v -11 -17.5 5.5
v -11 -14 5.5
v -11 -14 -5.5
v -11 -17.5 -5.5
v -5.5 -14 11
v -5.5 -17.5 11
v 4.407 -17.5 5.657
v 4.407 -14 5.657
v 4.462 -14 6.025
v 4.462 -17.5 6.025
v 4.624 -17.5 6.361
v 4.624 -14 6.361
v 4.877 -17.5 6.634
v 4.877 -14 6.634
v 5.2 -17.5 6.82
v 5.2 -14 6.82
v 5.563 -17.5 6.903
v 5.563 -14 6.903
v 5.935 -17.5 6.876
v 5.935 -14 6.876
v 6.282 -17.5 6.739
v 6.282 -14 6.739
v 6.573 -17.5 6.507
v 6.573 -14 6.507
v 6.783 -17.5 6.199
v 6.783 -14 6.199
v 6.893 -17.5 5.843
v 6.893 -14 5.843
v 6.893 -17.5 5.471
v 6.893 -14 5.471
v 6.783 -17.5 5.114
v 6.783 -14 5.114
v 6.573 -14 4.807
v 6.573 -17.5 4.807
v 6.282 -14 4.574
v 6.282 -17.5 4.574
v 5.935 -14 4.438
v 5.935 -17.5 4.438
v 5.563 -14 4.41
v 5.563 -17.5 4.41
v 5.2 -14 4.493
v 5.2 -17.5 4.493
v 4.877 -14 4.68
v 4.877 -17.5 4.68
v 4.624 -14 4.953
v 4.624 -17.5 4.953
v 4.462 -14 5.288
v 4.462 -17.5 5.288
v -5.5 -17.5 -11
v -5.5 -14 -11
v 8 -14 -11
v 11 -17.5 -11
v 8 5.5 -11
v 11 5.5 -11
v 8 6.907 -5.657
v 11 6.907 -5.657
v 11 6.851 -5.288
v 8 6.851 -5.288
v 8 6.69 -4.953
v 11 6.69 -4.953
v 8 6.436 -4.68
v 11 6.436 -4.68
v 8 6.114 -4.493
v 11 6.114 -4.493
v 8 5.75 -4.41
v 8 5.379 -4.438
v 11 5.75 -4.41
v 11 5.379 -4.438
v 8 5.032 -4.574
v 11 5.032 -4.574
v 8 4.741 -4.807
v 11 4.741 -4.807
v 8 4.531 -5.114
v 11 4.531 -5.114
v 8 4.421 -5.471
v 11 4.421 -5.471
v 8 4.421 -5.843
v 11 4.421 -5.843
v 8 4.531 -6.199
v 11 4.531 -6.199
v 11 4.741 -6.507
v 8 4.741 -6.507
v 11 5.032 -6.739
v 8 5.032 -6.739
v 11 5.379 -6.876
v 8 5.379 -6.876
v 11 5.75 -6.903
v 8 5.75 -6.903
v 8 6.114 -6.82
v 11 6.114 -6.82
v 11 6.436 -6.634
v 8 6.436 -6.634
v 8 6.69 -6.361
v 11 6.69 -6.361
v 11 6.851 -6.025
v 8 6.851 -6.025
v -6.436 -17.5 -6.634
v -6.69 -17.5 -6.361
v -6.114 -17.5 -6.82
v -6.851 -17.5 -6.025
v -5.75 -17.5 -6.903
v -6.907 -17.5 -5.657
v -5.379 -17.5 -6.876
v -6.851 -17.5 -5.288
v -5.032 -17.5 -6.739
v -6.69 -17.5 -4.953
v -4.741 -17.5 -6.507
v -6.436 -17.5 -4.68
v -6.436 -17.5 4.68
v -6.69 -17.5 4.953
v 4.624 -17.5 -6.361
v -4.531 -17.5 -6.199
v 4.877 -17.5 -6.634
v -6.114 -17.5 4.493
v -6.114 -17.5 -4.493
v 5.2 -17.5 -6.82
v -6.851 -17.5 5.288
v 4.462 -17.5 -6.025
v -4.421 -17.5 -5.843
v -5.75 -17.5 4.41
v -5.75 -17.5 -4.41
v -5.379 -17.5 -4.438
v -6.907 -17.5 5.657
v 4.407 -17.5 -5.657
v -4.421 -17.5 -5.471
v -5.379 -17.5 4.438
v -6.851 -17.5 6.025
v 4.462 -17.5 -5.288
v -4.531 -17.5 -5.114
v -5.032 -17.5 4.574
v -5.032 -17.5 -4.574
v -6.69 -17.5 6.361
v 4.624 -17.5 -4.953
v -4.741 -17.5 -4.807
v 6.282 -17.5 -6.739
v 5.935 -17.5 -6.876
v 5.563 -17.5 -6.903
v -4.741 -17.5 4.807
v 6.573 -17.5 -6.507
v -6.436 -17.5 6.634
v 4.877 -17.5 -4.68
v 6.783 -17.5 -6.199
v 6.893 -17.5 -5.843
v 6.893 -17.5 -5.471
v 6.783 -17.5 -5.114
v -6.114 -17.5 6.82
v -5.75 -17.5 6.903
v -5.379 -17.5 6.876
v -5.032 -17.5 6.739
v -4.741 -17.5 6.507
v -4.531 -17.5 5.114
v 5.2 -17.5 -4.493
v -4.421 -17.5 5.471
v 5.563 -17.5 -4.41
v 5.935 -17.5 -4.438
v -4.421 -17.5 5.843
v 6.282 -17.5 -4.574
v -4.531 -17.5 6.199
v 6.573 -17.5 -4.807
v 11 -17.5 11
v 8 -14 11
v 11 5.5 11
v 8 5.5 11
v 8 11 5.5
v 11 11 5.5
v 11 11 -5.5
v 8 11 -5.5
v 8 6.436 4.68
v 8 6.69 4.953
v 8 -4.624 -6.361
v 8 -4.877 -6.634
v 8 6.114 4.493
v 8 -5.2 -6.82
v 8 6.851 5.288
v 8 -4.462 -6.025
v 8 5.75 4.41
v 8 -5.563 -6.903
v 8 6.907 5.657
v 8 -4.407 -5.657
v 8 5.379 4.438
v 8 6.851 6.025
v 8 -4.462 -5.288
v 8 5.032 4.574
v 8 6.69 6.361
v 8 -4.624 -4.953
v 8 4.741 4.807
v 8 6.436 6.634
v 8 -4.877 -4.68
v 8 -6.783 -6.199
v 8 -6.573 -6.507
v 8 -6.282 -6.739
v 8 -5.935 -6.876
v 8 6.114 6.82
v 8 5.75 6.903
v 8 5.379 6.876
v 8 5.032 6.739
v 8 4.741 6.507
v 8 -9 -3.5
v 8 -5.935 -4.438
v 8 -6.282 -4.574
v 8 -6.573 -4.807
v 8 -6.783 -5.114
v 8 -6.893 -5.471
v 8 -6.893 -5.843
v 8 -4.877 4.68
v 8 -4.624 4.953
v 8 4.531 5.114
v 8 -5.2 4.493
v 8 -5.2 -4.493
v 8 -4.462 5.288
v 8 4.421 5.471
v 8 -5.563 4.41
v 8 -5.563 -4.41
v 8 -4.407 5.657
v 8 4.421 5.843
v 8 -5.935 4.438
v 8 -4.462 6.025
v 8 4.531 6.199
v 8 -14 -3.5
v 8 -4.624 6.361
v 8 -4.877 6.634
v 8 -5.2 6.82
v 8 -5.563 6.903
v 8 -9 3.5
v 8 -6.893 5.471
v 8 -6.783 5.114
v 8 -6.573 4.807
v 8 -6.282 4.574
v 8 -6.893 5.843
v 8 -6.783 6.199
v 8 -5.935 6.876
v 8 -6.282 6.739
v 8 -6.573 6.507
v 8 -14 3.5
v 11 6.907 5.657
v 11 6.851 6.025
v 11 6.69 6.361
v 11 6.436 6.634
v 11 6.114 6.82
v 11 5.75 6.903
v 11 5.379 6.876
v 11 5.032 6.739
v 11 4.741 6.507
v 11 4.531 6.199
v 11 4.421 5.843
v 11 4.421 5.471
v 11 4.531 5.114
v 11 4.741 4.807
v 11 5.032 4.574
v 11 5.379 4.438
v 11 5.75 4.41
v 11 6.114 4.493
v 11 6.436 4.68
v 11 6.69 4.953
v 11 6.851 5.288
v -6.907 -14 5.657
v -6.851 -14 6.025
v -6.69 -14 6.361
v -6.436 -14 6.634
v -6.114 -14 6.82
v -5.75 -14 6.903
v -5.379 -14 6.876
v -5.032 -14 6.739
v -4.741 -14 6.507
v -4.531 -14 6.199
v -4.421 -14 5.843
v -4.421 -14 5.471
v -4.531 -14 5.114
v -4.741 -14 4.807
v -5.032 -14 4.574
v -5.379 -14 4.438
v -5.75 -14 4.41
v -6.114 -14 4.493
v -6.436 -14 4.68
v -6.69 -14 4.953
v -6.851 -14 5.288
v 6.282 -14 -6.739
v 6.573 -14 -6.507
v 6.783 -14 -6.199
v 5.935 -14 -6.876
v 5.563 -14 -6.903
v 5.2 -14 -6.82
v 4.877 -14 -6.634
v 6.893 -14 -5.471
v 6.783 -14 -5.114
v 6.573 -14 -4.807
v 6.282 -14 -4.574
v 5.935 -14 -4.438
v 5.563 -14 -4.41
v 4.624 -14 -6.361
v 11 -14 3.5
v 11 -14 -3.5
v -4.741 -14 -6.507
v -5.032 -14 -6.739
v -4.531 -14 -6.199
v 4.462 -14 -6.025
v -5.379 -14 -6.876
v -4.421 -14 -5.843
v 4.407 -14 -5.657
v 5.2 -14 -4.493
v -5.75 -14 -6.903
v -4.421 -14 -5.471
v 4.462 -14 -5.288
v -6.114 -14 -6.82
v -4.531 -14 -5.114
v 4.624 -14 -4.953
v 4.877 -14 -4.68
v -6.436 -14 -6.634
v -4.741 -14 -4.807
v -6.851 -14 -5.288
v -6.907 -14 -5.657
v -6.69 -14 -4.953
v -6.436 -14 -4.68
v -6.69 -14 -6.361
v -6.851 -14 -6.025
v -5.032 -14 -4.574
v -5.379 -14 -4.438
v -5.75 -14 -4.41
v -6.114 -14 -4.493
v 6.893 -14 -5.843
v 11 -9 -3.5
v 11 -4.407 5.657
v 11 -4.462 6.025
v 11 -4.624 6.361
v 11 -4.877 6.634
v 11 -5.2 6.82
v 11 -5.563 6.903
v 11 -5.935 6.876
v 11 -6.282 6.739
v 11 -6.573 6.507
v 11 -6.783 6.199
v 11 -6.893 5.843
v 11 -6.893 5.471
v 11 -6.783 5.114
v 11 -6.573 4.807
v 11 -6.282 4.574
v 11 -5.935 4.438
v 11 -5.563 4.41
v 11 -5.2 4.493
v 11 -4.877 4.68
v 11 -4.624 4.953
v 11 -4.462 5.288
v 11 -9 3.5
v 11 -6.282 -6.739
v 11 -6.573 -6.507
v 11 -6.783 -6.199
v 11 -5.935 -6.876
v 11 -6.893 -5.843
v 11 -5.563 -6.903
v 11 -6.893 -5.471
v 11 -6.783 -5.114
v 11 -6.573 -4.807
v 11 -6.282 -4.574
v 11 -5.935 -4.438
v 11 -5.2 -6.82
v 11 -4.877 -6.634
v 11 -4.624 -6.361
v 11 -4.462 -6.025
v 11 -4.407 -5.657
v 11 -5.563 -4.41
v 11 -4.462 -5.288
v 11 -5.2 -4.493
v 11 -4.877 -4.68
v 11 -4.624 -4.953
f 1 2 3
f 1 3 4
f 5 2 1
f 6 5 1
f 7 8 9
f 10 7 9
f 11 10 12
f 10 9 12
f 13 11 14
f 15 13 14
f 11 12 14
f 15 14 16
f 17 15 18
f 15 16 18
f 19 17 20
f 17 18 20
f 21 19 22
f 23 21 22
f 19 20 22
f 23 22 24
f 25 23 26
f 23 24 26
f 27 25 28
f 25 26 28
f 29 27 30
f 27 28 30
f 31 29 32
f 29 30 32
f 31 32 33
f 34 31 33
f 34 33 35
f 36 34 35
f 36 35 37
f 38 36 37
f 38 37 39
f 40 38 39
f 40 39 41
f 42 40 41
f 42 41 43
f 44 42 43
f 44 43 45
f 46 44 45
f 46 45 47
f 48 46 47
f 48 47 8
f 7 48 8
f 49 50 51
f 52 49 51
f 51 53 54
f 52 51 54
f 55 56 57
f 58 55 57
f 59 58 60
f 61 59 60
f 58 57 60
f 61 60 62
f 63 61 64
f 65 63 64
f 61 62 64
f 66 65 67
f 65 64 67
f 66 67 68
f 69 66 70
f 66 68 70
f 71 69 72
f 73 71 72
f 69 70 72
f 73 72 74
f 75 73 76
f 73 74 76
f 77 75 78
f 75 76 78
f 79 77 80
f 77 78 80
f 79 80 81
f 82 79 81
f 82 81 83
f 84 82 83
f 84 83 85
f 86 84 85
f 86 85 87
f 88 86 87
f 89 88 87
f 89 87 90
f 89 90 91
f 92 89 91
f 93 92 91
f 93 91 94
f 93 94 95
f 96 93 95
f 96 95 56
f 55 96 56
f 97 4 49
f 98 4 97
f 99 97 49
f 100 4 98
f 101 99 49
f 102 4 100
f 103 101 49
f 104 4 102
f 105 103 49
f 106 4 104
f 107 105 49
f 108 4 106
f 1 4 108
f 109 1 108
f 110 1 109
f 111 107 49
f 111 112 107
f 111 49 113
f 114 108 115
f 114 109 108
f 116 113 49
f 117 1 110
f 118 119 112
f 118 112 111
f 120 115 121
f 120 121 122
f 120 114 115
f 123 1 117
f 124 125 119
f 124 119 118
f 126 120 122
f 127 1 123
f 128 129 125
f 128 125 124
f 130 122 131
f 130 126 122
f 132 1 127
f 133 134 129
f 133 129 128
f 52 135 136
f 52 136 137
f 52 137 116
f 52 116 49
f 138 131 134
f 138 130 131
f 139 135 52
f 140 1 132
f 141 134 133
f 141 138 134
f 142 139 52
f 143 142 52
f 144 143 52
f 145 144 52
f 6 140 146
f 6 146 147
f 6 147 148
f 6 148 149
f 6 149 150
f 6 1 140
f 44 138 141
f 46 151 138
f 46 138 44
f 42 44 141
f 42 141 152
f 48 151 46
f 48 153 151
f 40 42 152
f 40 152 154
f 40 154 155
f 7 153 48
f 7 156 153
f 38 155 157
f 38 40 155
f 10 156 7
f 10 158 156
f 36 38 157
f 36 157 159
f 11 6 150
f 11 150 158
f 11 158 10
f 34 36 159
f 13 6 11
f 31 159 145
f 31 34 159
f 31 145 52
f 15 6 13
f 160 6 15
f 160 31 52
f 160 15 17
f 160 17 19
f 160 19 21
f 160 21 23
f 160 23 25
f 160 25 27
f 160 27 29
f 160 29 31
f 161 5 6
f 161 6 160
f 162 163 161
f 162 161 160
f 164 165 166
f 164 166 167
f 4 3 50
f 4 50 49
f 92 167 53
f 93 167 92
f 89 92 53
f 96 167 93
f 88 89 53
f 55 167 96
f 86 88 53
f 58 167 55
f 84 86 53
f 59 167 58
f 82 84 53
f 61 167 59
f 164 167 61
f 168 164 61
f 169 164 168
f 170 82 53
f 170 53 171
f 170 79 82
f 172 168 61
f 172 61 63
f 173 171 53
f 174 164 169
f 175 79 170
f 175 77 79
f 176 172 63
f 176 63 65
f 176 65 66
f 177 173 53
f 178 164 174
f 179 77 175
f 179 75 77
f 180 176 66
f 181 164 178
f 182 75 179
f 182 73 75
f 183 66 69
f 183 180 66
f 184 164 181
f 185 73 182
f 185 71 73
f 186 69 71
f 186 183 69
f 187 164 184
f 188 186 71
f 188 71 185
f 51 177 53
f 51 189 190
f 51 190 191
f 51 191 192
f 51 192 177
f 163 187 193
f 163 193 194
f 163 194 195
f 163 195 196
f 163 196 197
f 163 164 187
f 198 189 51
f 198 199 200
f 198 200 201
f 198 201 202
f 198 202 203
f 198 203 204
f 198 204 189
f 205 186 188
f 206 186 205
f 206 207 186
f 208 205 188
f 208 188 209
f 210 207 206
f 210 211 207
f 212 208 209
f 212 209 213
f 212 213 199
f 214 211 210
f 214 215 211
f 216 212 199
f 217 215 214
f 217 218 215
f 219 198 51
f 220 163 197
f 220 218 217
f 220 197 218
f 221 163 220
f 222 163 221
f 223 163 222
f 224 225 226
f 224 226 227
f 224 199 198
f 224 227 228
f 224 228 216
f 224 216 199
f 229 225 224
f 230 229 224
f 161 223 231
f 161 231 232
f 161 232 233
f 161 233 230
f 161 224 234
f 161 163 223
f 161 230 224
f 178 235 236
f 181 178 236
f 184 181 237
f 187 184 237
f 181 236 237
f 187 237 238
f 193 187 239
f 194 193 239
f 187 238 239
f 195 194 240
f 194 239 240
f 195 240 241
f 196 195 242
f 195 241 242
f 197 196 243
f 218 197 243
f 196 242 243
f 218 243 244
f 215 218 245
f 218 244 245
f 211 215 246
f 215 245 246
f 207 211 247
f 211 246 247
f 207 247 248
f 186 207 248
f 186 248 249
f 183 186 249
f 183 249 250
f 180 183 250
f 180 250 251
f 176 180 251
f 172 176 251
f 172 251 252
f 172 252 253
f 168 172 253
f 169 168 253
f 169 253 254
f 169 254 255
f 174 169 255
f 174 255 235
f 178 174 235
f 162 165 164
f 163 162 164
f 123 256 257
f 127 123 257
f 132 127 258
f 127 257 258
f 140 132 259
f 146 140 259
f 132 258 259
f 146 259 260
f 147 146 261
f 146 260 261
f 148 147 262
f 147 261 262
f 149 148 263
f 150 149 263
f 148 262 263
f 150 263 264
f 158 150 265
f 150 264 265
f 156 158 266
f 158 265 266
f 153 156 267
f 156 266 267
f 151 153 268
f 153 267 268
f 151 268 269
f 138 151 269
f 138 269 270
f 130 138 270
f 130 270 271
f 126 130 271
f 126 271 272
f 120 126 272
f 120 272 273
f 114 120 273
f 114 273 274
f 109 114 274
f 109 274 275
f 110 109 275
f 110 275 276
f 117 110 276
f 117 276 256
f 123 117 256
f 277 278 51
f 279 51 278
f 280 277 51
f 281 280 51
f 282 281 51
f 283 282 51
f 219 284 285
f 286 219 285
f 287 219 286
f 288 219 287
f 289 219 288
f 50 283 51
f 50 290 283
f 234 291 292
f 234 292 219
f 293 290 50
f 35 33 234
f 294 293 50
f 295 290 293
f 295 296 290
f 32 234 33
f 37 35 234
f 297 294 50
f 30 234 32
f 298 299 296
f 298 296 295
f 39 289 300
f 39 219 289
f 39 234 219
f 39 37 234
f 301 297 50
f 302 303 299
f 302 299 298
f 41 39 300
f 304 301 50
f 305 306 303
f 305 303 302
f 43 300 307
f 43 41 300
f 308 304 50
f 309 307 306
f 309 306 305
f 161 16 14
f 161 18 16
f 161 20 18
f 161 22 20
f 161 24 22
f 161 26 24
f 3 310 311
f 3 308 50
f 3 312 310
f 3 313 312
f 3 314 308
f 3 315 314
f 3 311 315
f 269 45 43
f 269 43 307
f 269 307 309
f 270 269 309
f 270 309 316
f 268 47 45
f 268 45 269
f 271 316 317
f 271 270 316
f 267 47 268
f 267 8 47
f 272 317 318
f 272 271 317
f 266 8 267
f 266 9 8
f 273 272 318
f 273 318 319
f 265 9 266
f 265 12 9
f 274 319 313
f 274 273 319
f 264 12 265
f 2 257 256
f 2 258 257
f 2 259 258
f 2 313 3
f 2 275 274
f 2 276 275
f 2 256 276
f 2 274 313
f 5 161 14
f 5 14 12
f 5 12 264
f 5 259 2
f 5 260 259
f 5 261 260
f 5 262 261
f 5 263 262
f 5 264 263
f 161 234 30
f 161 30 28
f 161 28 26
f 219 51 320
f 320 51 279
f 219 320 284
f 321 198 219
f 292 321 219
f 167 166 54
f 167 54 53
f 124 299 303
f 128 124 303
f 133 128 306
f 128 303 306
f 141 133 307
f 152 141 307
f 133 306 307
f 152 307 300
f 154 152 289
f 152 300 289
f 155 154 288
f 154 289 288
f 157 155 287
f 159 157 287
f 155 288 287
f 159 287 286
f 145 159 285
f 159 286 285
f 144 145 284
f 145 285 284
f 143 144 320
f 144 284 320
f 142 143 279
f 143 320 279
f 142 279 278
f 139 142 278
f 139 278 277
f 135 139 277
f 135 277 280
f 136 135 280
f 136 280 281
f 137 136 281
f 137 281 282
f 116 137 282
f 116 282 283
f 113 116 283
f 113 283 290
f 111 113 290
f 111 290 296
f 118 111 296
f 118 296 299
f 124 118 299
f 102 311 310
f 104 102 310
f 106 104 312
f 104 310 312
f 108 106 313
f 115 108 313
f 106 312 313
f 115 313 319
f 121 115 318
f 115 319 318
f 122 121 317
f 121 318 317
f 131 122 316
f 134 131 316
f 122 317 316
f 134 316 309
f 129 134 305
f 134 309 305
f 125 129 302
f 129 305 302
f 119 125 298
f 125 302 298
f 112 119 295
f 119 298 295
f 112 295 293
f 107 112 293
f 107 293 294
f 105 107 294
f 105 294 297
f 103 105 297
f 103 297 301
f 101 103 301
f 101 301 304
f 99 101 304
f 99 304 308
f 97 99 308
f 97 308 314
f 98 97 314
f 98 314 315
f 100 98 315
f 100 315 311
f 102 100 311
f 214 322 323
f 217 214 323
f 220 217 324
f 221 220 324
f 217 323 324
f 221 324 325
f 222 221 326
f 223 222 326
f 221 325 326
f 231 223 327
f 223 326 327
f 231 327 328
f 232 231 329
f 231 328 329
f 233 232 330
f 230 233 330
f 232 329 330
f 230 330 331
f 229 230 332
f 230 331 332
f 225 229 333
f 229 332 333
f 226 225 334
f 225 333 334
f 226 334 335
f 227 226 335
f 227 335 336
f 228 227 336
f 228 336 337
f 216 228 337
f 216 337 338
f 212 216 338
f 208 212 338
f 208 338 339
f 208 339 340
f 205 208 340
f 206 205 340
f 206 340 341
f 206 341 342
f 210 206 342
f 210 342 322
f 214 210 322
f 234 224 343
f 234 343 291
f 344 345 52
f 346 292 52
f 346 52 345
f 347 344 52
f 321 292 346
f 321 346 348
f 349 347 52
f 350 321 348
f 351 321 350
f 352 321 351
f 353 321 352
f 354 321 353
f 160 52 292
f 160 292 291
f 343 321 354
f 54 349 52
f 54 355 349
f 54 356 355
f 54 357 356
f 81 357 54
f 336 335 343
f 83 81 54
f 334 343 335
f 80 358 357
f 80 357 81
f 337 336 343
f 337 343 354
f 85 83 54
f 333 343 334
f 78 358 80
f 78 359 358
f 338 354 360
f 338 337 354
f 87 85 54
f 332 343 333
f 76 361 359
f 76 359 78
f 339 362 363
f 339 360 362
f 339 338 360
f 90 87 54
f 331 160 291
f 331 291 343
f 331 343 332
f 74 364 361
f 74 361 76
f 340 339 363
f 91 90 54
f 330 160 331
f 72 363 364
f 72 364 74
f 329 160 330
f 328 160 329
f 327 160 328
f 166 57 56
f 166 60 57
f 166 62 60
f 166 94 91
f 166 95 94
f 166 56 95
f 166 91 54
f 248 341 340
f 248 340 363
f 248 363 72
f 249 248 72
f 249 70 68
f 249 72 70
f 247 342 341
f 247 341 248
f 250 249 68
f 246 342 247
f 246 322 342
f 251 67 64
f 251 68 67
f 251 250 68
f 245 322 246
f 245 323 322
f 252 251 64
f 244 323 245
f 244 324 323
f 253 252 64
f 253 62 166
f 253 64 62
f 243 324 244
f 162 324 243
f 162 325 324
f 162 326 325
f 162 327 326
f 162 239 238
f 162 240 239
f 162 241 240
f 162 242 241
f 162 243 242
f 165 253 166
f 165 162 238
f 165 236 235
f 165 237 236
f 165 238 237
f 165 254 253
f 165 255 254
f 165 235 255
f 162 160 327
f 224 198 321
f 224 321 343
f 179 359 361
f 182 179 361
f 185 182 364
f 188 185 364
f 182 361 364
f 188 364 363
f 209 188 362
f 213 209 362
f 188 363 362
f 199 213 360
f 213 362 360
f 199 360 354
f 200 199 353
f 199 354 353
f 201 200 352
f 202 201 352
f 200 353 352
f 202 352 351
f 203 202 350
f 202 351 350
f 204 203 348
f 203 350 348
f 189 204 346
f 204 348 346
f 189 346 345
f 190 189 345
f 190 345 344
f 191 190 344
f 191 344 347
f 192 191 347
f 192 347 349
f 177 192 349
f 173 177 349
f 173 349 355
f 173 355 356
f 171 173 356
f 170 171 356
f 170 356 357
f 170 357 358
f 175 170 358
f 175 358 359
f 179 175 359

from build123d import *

# Parameters (mm, degrees)
F1_DEPTH = 11
F2_R     = 1.25
F3_DEPTH = 22.001
F4_R     = 1.25
F5_DEPTH = 3.501
F6_SIZE  = 5.5
F7_W     = 5
F7_H     = 7
F8_DEPTH = 25


with BuildPart() as f1:
    # F0 (on Top) → F1 (new body, symmetric)
    with BuildSketch(Plane.XY):
        Polygon((11, 11), (8, 11), (8, -14), (-11, -14), (-11, -17.5), (11, -17.5), align=None)
    extrude(amount=F1_DEPTH, both=True)

    # F2 (on face) → F3 (cut, through all)
    with BuildSketch(Plane.YZ.offset(11)):
        with Locations((5.656854, -5.656854)):
            Circle(F2_R)
        with Locations((5.656854, 5.656854)):
            Circle(F2_R)
        with Locations((-5.656854, 5.656854)):
            Circle(F2_R)
        with Locations((-5.656854, -5.656854)):
            Circle(F2_R)
    extrude(amount=-F3_DEPTH, mode=Mode.SUBTRACT)

    # F4 (on face) → F5 (cut, through all)
    with BuildSketch(Plane(origin=(0, -14, 0), x_dir=(-1, 0, 0), z_dir=(0, 1, 0))):
        with Locations((5.656854, -5.656854)):
            Circle(F4_R)
        with Locations((5.656854, 5.656854)):
            Circle(F4_R)
        with Locations((-5.656854, 5.656854)):
            Circle(F4_R)
        with Locations((-5.656854, -5.656854)):
            Circle(F4_R)
    extrude(amount=-F5_DEPTH, mode=Mode.SUBTRACT)

    # F6
    f6_edges = [f1.edges().sort_by_distance(p)[0] for p in [
        (9.5, 11, 11),
        (9.5, 11, -11),
        (-11, -15.75, -11),
        (-11, -15.75, 11),
    ]]
    chamfer(f6_edges, length=F6_SIZE)

    # F7 (on face) → F8 (cut)
    with BuildSketch(Plane(origin=(8, 0, 0), x_dir=(0, -1, 0), z_dir=(-1, 0, 0))):
        with Locations((11.5, 0)):
            Rectangle(F7_W, F7_H)
    extrude(amount=-F8_DEPTH, mode=Mode.SUBTRACT)


solid = f1.part
